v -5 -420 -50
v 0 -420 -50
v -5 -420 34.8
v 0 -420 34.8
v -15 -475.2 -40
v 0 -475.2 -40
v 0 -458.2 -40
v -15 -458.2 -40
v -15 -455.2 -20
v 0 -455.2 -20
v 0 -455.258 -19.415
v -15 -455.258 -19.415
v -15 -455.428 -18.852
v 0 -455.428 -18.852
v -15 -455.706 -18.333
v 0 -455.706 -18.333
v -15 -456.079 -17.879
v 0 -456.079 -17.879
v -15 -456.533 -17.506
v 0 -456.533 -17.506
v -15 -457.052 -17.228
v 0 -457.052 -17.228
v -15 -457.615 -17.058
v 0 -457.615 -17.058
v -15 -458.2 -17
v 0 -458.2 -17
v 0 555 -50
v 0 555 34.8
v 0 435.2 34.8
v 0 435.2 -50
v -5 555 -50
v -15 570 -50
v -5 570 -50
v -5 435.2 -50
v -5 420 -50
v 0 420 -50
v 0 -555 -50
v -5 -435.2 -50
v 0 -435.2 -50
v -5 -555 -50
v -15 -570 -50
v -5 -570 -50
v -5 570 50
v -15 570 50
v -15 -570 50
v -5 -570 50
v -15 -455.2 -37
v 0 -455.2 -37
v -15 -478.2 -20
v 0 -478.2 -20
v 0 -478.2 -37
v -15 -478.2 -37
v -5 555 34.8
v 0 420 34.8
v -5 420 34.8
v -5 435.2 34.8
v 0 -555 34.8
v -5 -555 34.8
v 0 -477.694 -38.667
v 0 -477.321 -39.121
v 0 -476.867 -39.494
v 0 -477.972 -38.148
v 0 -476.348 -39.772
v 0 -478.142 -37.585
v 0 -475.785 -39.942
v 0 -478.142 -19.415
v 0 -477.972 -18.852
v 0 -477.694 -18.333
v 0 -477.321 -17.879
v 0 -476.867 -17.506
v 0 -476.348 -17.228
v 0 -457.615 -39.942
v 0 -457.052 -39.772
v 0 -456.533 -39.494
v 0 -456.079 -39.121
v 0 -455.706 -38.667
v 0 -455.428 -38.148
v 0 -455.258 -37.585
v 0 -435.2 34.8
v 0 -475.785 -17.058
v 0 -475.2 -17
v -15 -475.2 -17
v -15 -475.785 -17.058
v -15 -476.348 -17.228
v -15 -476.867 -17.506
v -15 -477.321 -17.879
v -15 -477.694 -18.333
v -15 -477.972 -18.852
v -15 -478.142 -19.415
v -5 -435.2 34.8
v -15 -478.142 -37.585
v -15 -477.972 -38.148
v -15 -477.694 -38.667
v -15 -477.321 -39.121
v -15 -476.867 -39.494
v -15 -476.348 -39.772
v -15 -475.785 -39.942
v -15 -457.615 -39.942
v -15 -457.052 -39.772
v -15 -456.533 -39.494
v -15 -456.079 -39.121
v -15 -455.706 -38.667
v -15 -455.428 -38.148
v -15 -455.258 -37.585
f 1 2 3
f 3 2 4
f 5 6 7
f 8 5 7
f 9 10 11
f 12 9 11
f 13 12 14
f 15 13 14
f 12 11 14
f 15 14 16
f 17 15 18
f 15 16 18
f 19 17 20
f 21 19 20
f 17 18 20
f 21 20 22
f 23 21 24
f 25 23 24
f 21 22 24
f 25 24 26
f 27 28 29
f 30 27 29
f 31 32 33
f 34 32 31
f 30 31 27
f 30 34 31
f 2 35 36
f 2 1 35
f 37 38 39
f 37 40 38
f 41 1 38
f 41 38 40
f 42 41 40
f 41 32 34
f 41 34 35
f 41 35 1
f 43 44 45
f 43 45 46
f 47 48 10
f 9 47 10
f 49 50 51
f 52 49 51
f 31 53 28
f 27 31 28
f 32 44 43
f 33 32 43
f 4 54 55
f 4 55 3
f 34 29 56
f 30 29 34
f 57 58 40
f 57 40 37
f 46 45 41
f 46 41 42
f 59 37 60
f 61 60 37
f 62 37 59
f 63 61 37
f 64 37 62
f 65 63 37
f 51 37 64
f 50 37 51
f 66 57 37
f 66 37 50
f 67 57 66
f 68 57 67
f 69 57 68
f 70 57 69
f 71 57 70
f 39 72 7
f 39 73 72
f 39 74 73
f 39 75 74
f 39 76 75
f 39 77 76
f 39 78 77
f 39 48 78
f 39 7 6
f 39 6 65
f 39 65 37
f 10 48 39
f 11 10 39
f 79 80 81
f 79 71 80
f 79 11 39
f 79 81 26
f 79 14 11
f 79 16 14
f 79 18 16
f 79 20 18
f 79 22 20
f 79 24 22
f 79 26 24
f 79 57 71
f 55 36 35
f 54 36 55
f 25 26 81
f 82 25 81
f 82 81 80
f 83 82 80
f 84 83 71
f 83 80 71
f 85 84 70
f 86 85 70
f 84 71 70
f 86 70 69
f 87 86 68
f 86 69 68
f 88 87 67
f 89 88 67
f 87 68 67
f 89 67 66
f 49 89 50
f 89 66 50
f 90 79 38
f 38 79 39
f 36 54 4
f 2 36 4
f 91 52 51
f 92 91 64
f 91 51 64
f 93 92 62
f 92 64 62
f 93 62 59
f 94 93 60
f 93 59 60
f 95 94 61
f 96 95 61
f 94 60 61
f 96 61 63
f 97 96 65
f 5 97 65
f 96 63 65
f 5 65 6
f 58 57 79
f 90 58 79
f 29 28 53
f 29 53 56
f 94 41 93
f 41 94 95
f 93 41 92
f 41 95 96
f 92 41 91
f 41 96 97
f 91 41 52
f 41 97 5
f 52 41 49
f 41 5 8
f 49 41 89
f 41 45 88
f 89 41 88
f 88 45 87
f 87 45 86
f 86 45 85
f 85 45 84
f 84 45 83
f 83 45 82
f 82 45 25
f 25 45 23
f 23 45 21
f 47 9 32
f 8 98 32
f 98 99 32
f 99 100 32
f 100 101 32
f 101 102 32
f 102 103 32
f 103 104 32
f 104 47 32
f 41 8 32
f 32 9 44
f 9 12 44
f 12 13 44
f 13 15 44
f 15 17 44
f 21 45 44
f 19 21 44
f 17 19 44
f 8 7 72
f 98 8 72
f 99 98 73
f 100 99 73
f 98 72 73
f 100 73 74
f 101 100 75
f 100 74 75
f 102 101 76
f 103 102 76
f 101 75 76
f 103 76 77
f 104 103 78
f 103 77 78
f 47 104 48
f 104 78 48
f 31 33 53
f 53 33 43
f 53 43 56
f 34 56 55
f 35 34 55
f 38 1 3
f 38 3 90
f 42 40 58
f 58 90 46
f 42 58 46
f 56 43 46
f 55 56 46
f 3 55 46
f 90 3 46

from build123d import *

# Parameters (mm, degrees)
F1_DEPTH = 50
F3_DEPTH = 5
F6_DEPTH = 15


with BuildPart() as f1:
    # F0 (on Top) → F1 (new body, symmetric)
    with BuildSketch(Plane.XY):
        Polygon((0, -555), (0, 0), (-15, 0), (-15, -570), (-5, -570), (-5, -555), align=None)
    extrude(amount=F1_DEPTH, both=True)

    # F2 (on face) → F3 (cut)
    with BuildSketch(Plane.YZ):
        Polygon((-435.2, 34.8), (-435.2, -50), (-420, -50), (-420, 34.8), (0, 34.8), (0, 50), (-555, 50), (-555, 34.8), align=None)
    extrude(amount=-F3_DEPTH, mode=Mode.SUBTRACT)

    # F4: F1 across face


with BuildPart() as f1_1:
    add(f1.part)
    add(f1.part.mirror(Plane(origin=(-7.766854, 0, -2.262921), x_dir=(-1, 0, 0), z_dir=(0, 1, 0))))

    # F5 (on face) → F6 (cut, through all)
    with BuildSketch(Plane.YZ):
        with BuildLine():
            Line((-478.2, -20), (-478.2, -37))
            ThreePointArc((-478.2, -37), (-477.32132, -39.12132), (-475.2, -40))
            Line((-475.2, -40), (-458.2, -40))
            ThreePointArc((-458.2, -40), (-456.07868, -39.12132), (-455.2, -37))
            Line((-455.2, -37), (-455.2, -20))
            ThreePointArc((-455.2, -20), (-456.07868, -17.87868), (-458.2, -17))
            Line((-458.2, -17), (-475.2, -17))
            ThreePointArc((-475.2, -17), (-477.32132, -17.87868), (-478.2, -20))
        make_face()
    extrude(amount=-F6_DEPTH, mode=Mode.SUBTRACT)


solid = f1_1.part
